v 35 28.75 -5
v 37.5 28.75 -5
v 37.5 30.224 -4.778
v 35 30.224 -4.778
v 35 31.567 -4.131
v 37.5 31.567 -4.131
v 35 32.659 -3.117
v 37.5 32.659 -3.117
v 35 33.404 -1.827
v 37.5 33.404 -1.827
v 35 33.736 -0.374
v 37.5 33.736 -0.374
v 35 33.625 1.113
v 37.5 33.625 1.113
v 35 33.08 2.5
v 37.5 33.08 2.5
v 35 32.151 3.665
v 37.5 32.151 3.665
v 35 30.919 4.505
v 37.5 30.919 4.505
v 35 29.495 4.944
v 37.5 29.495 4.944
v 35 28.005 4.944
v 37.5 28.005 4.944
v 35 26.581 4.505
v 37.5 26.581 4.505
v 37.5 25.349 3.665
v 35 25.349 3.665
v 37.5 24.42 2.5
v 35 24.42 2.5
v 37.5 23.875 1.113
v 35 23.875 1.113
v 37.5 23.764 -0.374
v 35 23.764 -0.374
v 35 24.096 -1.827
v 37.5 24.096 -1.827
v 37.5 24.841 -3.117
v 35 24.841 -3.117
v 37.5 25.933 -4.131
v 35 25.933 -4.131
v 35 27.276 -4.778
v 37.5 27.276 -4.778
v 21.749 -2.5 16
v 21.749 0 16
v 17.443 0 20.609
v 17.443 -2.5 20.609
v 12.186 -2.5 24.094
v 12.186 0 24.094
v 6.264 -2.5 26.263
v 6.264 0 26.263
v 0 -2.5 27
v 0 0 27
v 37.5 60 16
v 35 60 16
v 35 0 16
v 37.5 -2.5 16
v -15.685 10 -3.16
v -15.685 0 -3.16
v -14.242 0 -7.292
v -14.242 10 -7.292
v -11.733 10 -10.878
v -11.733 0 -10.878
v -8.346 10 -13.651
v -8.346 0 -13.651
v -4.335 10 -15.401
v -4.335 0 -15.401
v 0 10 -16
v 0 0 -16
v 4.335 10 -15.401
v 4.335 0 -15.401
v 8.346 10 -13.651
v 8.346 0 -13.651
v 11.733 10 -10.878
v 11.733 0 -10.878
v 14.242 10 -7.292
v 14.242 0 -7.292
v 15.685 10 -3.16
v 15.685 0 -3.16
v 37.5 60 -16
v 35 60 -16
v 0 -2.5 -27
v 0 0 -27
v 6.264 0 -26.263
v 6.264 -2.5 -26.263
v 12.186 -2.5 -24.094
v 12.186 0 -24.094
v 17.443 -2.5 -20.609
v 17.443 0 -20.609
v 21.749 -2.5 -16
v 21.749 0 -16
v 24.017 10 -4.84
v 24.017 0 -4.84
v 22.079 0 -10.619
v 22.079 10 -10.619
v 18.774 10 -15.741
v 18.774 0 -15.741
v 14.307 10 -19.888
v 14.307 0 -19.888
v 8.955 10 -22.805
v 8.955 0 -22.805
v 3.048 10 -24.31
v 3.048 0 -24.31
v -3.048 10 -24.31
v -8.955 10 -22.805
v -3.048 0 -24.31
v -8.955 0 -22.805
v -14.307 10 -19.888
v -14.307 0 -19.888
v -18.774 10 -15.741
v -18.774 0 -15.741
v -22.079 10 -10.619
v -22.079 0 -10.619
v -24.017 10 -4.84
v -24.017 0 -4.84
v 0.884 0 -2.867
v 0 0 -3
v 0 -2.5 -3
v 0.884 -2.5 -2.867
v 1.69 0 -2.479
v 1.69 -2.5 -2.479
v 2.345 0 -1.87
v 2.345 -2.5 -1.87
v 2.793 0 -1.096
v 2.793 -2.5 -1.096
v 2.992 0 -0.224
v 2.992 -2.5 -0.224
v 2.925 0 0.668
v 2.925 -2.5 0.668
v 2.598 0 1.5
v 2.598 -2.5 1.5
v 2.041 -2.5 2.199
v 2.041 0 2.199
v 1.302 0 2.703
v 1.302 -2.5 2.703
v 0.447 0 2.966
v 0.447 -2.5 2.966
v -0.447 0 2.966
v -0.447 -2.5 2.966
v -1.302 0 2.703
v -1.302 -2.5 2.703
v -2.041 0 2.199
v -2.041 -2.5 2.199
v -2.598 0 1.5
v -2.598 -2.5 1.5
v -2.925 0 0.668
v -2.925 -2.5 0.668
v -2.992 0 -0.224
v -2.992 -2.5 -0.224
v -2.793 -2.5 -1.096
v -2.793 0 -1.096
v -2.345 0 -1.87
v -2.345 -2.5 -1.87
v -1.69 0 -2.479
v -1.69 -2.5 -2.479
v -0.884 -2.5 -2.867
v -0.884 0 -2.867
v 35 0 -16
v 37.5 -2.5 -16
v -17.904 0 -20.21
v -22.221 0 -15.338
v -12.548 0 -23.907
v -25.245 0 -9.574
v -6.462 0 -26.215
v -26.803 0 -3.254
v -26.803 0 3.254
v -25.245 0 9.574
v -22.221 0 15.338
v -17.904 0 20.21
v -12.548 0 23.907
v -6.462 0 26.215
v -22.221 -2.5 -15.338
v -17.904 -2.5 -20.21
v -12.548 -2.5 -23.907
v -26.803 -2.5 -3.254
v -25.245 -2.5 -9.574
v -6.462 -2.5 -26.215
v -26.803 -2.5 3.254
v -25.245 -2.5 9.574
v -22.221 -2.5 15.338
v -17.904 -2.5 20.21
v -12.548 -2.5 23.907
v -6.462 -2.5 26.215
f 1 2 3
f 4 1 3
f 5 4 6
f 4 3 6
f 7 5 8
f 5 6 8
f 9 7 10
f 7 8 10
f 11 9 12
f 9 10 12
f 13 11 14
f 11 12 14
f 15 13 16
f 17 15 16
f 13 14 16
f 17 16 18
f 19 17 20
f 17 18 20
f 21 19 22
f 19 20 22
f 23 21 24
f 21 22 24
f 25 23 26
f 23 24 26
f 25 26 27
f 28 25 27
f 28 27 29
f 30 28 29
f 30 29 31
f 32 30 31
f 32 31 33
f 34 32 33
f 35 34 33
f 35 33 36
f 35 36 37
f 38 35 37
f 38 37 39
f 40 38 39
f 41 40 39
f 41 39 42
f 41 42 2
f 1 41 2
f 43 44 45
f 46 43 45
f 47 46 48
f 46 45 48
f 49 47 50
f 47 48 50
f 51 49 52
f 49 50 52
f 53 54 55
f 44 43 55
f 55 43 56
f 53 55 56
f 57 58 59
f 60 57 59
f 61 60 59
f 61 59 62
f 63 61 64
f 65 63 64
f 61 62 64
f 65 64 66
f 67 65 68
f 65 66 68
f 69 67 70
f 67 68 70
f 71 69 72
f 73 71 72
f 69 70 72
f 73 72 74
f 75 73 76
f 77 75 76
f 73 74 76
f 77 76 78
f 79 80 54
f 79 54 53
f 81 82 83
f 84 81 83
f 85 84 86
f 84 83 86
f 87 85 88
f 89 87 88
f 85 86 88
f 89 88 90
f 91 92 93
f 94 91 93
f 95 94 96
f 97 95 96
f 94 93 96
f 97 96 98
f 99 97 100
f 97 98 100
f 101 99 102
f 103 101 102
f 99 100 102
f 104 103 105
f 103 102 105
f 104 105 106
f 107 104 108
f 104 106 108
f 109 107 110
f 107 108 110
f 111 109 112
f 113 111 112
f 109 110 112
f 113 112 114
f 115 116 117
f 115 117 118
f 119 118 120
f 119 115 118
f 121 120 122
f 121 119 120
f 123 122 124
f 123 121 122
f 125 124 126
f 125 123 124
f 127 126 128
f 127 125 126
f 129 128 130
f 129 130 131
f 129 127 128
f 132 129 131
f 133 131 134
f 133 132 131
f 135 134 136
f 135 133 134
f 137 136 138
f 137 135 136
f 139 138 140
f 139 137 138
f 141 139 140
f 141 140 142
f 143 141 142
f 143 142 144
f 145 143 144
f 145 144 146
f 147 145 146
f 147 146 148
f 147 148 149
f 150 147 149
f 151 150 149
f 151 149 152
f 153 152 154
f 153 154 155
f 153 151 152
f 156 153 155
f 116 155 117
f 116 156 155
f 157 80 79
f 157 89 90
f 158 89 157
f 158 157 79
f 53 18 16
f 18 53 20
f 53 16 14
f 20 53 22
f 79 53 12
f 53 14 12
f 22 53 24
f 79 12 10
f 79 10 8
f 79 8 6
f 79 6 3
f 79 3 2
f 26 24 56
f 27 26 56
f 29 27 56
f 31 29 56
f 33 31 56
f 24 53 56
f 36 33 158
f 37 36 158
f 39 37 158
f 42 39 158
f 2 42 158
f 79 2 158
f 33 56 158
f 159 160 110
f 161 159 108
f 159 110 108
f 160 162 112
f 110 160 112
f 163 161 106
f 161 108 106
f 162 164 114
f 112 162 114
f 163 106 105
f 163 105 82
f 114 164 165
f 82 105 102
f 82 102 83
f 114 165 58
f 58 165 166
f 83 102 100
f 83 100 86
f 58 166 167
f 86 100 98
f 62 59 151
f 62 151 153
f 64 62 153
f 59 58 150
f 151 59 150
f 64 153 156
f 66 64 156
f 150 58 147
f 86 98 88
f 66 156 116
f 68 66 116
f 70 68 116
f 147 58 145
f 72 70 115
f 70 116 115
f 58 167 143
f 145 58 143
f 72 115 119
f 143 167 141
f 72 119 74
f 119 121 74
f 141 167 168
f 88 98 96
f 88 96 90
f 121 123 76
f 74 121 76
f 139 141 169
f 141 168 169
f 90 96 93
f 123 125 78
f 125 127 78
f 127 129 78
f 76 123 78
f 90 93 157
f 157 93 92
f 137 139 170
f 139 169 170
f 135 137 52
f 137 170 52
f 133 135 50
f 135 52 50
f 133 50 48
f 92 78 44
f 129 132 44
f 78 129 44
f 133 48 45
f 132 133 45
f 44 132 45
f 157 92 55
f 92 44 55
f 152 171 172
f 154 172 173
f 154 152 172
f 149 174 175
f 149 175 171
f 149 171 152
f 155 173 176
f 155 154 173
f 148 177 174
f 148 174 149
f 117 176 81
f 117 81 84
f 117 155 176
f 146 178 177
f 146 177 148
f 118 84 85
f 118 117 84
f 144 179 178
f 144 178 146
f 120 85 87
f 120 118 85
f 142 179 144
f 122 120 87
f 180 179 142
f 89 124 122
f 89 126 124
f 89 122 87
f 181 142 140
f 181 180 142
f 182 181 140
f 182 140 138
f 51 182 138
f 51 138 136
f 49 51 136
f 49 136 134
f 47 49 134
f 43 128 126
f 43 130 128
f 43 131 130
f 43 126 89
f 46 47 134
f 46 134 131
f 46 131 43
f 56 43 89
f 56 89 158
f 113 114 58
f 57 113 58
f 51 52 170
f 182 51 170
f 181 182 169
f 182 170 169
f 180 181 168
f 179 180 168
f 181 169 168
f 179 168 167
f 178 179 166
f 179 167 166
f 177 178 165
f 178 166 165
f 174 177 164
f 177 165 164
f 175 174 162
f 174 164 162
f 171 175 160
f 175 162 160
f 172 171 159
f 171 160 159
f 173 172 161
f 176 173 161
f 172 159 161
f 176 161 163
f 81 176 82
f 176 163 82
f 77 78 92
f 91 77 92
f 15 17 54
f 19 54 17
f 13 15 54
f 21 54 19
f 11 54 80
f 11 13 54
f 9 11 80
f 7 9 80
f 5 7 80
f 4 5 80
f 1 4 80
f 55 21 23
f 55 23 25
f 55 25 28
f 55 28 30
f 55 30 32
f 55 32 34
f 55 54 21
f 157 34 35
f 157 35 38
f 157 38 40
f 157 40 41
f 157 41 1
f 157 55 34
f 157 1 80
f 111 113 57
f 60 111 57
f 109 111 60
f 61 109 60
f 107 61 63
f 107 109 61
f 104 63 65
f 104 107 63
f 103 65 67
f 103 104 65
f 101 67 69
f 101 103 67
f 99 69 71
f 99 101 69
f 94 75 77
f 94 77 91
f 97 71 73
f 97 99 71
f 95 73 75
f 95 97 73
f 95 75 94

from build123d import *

# Parameters (mm, degrees)
BOSS_EXTRUDE1_DEPTH = 10
SKETCH2_R           = 3
BOSS_EXTRUDE2_DEPTH = 2.5
SKETCH4_W           = 2.5
SKETCH4_H           = 32
BOSS_EXTRUDE3_DEPTH = 60
SKETCH5_R           = 5
CUT_EXTRUDE1_DEPTH  = 10


with BuildPart() as part:
    # Sketch1 → Boss-Extrude1 (new body)
    with BuildSketch(Plane(origin=(0, 0, 0), x_dir=(1, 0, 0), z_dir=(0, 1, 0))):
        with BuildLine():
            Line((-24.017268371, 4.839506173), (-15.684746691, 3.160493827))
            ThreePointArc((-15.684746691, 3.160493827), (0, 16), (15.684746691, 3.160493827))
            Line((15.684746691, 3.160493827), (24.017268371, 4.839506173))
            ThreePointArc((24.017268371, 4.839506173), (0, 24.5), (-24.017268371, 4.839506173))
        make_face()
    extrude(amount=BOSS_EXTRUDE1_DEPTH)

    # Sketch2 → Boss-Extrude2 (add)
    with BuildSketch(Plane.XZ):
        with BuildLine():
            Line((37.5, -16), (37.5, 16))
            Line((37.5, 16), (21.748563171, 16))
            ThreePointArc((21.748563171, 16), (12.186057607, 24.093567606), (0, 27))
            ThreePointArc((0, 27), (-27, 0), (0, -27))
            ThreePointArc((0, -27), (12.186057607, -24.093567606), (21.748563171, -16))
            Line((21.748563171, -16), (37.5, -16))
        make_face()
        Circle(SKETCH2_R, mode=Mode.SUBTRACT)
    extrude(amount=BOSS_EXTRUDE2_DEPTH)

    # Sketch4 → Boss-Extrude3 (add)
    with BuildSketch(Plane(origin=(0, 0, 0), x_dir=(1, 0, 0), z_dir=(0, 1, 0))):
        with Locations((36.25, 0)):
            Rectangle(SKETCH4_W, SKETCH4_H)
    extrude(amount=BOSS_EXTRUDE3_DEPTH)

    # Sketch5 → Cut-Extrude1 (cut)
    with BuildSketch(Plane(origin=(37.5, 0, 0), x_dir=(0, 0, -1), z_dir=(1, 0, 0))):
        with Locations((0, 28.75)):
            Circle(SKETCH5_R)
    extrude(amount=-CUT_EXTRUDE1_DEPTH, mode=Mode.SUBTRACT)


solid = part.part
